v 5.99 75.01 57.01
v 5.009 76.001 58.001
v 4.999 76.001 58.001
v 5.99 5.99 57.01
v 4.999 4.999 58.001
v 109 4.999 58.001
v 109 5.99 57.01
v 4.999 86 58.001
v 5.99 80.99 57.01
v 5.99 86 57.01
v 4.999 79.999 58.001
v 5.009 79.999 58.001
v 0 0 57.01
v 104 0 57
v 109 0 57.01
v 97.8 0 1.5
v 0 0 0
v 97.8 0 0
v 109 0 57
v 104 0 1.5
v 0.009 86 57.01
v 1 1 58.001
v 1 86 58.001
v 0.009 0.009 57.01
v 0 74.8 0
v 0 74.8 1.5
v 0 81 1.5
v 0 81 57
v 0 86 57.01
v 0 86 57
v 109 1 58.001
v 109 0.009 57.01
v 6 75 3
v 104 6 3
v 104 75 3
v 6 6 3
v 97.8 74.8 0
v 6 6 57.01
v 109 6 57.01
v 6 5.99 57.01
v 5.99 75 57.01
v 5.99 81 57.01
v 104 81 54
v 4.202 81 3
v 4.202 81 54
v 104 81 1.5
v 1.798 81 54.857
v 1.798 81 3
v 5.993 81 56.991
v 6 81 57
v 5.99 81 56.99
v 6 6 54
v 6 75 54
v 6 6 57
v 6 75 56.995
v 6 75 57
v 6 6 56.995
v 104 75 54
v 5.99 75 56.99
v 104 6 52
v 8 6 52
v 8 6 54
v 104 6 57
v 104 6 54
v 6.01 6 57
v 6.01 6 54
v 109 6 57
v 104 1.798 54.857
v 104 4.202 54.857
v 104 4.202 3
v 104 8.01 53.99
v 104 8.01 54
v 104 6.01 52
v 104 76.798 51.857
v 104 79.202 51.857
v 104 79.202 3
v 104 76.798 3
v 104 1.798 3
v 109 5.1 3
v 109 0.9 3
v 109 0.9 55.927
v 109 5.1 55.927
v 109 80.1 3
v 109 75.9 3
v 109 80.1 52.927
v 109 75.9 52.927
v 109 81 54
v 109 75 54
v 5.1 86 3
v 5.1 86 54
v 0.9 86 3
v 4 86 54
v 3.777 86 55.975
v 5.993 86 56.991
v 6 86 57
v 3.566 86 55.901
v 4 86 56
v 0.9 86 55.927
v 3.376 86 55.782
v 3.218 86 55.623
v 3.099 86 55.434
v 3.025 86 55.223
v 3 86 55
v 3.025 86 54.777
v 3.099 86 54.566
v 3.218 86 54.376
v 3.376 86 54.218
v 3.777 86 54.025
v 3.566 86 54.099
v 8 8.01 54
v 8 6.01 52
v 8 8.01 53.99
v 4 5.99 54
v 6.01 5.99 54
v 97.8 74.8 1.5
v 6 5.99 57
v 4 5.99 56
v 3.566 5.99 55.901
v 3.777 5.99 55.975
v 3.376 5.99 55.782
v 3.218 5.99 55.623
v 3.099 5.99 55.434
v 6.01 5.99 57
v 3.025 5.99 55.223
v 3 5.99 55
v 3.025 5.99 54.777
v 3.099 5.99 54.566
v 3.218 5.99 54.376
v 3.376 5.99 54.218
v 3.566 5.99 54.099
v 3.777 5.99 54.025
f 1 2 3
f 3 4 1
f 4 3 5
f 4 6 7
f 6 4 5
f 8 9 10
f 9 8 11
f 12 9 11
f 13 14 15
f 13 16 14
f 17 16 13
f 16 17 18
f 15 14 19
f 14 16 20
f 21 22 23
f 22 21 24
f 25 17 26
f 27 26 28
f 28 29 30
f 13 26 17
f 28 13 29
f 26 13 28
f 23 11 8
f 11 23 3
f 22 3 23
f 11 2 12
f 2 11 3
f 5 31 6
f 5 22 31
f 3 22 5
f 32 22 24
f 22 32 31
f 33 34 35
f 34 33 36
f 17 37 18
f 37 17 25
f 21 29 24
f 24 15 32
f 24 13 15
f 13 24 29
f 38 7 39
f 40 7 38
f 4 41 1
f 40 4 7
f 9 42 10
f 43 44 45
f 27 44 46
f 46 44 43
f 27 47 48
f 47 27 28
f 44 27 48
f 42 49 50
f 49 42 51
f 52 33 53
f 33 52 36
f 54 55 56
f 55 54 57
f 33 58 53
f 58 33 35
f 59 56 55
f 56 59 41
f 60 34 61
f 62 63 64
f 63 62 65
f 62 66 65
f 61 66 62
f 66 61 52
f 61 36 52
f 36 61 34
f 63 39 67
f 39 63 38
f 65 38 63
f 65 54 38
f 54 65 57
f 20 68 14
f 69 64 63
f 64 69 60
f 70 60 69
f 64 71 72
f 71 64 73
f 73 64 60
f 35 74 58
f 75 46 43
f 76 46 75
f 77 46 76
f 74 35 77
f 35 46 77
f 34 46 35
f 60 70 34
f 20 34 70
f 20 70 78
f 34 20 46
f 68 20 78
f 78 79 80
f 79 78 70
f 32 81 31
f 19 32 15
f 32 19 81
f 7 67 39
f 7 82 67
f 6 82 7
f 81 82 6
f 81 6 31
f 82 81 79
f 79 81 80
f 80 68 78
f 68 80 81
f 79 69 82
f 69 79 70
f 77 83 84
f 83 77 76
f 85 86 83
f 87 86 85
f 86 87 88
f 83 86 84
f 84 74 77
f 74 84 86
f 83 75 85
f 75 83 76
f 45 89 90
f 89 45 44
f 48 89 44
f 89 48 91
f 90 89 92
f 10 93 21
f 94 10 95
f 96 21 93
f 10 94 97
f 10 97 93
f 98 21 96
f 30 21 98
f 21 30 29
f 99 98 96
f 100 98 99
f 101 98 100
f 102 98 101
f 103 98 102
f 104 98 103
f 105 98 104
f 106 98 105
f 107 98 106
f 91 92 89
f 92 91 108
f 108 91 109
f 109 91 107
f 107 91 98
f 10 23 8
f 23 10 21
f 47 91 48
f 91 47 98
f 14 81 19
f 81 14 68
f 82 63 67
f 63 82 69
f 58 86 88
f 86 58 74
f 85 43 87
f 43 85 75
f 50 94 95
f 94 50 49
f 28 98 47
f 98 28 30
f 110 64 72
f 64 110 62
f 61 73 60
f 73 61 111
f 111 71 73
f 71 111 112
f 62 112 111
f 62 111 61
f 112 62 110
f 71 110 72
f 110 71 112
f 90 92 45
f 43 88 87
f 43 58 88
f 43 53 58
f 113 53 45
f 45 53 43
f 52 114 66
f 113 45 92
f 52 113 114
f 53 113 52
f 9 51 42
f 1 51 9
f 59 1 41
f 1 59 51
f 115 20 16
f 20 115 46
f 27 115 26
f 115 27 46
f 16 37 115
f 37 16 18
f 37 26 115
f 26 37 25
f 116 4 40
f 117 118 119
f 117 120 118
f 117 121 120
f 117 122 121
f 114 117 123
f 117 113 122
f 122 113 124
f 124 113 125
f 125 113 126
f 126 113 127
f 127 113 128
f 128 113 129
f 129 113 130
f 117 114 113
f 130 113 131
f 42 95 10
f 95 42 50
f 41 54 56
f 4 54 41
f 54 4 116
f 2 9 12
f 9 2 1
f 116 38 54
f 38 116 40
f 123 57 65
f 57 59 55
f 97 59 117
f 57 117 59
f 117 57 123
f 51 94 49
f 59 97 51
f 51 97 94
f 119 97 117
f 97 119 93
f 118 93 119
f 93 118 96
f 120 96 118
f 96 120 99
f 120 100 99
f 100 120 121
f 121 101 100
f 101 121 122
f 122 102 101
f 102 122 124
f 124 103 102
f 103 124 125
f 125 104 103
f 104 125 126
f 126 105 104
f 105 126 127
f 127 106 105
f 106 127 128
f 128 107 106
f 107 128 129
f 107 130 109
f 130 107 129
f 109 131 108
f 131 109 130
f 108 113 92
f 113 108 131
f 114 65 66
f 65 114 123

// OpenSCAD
// ============================================================================
// cutlery_box.scad
// Graduated 3-chamber disposable-cutlery box (Option 3) — CUT-FROM-SOLID port
// of build_box.py, for a 120 x 120 x 120 mm printer (AOSEED).
//
// WHY THIS PORT EXISTS (the whole point):
//   The hand-mesh generator (build_box.py) could not keep the 1 mm rim chamfer
//   continuous across the female dovetail joints, because where a slot's flared
//   corner crosses the sloped chamfer it needs a true boolean intersection.
//   OpenSCAD HAS that boolean kernel, so here we do exactly the "cut-from-solid"
//   thing:
//      1. Build the ENTIRE box as ONE solid, WITH the chamfer already on it.
//      2. difference() out vertical dovetail prisms ( /_\ cross-section ),
//         running from just above the base plate up THROUGH the rim, to both
//         (a) form the sliding-dovetail joints, and
//         (b) split the box into 6 bed-sized pieces.
//   Because the cut is a real boolean through the already-chamfered solid, the
//   sloped chamfer<->slot edge is produced for free => the rim chamfer stays
//   CONTINUOUS across every joint, with none of the sliver hacks.
//
// ----------------------------------------------------------------------------
// HOW TO USE
//   In the app:  set `part` below (or use the Customizer dropdown), F5 to
//                preview, F6 to render, then File > Export > STL.
//   One piece (CLI):
//      openscad -o body_knife_A.stl -D 'part="knife_A"' cutlery_box.scad
//   ALL SIX (bash, run from this folder):
//      for p in knife_A knife_B fork_A fork_B spoon_A spoon_B; do \
//        openscad -o "body_$p.stl" -D "part=\"$p\"" cutlery_box.scad ; done
//   PNG preview of one piece:
//      openscad -o knife_B.png --imgsize=1400,1000 --autocenter --viewall \
//        -D 'part="knife_B"' cutlery_box.scad
//
//   Pieces are modelled in ASSEMBLED coordinates (floor-down, z=0 is the bed),
//   so importing all six STLs together shows the assembled box directly; your
//   slicer will auto-drop each one onto the plate for printing.
//
// BED SANITY: every piece is <= 120 mm in X, Y, Z.
//   Z = 58 mm. Widest piece = spoon at 117 mm (Y). A-halves reach 109 mm (X,
//   including the protruding dovetail key). All under 120.
//
// !! I could NOT run OpenSCAD to verify this file (no binary in my sandbox) !!
//   - The rim chamfer is a SMOOTH, true-45 bevel built from hull() frustums of
//     convex rectangles. Works in every OpenSCAD since ~2015 (incl. Homebrew
//     2021.01). No stepped staircase -- and, crucially, it makes box() a clean
//     well-formed solid so the per-part booleans resolve reliably (the old
//     14-slice staircase was fragile and CGAL was dropping the walls of the
//     interior parts, leaving only the key prisms => "floating boxes").
//   - roof() is still available behind USE_ROOF=true for those who have it
//     (2021.01+ snapshots); for THIS rectangular design it is identical, so it
//     is NOT required.
//   - After F6, check the console for "WARNING"/"not a valid 2-manifold".
//     If a tenon ever looks detached, bump EPS to 0.05.
// ============================================================================


/* [Part to render / export] */
part = "knife_A"; // [knife_A, knife_B, fork_A, fork_B, spoon_A, spoon_B, assembly]

/* [Chamfer method] */
// false = smooth hull() frustum bevel (default, any OpenSCAD); true = roof() (2021.01+)
USE_ROOF = false;

/* [Heights (mm)] */
BASE   = 3.0;     // floor / base-plate thickness
COMP_H = 55.0;    // interior wall height above the floor (cutlery stack depth)

/* [Walls (mm)] */
HOST_T   = 6.0;     // thickness of every wall (thick enough to host a dovetail)
HALF_LEN = 104.0;   // printed length of each half (A = near, B = far); <120 incl. key

/* [Chamber bays (mm)] */
N_COL     = 3;       // columns of cutlery per chamber
KNIFE_COL = 23.0;    // -> knife bay 69  (3 x 19 mm knives + play)
FORK_COL  = 33.0;    // -> fork  bay 99  (3 x 29 mm forks  + play)
SPOON_COL = 37.0;    // -> spoon bay 111 (3 x 34 mm spoons + play, trimmed <120)

/* [Dovetail joint (mm)] */
DT_DEPTH = 5.0;   // tail protrusion past the seam (male key depth)
DT_NECK  = 1.2;   // half-width at the seam face (narrow)
DT_FLARE = 2.1;   // half-width at the tip (wide -> locks)
DT_CLR   = 0.4;   // FLANK/seam slide clearance added to the female socket (do not change for fit)
DT_DEPTH_RELIEF = 0.3; // extra depth on the socket BACK only, so the tail tip never bottoms out

/* [Hidden-dovetail top cap / "hat" (mm)] */
// The dovetail otherwise shows its trapezoid outline on the TOP edge of the wall.
// To hide it, the MALE piece extends the wall's full-width top (chamfer included)
// across the key footprint -> a flush, continuous top. The FEMALE piece gets a
// matching top RECESS (cap footprint + CAP_CLR) so the cap drops straight in.
// Result: the top reads as one surface with a single straight seam line at the cap
// tip; the dovetail joinery lives entirely below the cap.
//
// SELF-SUPPORTING UNDERSIDE: the cap reaches the FULL wall width at the chamfer base
// (so the top edge reads as the wall extended, with NO recessed sliver on the outer
// face), and its underside is ONE planar ramp from the chamfer's OUTER CORNER
// (half-width HOST_T/2 at z = BODY_H-CHAMFER) down to the dovetail-neck half-width
// (CAP_FOOT) at CAP_SLANT_DEG from horizontal. No little horizontal step. The ramp
// reaching full width exactly at the chamfer base means "ramp top" == "chamfer base"
// (CAP_H is DERIVED). The FEMALE recess is the same ramp + CAP_CLR play.
// TRADEOFF: because the cap runs all the way to the outer corner, the female wall
// tapers to ~0 at z = BODY_H-CHAMFER -> a thin feather edge at the joint (gradual at
// CAP_SLANT_DEG, hidden inside the joint when assembled). Accepted per design intent.
CAP_SLANT_DEG = 50;     // cap underside ramp angle from horizontal (50 = self-supporting, long flare)
CAP_FOOT = DT_NECK;     // cap-underside half-width where it meets the dovetail neck
CAP_CLR = 0.3;          // slide clearance so the male cap seats into the female top recess

/* [Rim chamfer (mm)] */
CHAMFER = 1.0;    // 45-deg comfort break broken along the top wall edges

/* [Base half-lap / anti-warp (mm)] */
// Neighbouring base plates overlap as a HORIZONTAL half-lap (shiplap) at mid-base
// height, so corners stay coplanar (no lift/protrusion). Horizontal lap faces do
// NOT bind the vertical-drop assembly. Shingle direction: A->B and knife->fork->spoon.
LAP_LEN = 6;        // overlap past the A/B seam and the knife/fork seam
LAP_LEN_FS = 2;     // overlap past the fork/SPOON seam -- SMALLER: spoon is the
                    // tightest piece (117mm of the 120mm bed); a 6mm lap there
                    // would push spoon to 123mm. 2mm keeps spoon at 119mm.
LAP_Z   = BASE/2;   // 1.5 -- horizontal split height of the lap (bottom vs top half)
LAP_CLR = 0.2;      // in-plane clearance so the shelf isn't a press fit

/* [Lid — box features that receive a flat ORDERED clear sheet] */
// The lid itself is NOT printed: it's a flat ~2 mm PETG/Tritan sheet, bullnose-polished
// edges (r=LID_EDGE_R), ordered to size. We only model the box features that receive it.
LID_T            = 2.0;   // ordered sheet thickness
LID_EDGE_R       = 1.0;   // ordered sheet bullnose edge radius (for the sheet order spec)
LID_PLAY         = 0.4;   // total vertical play in the hinge groove (sheet + this)
LID_RECESS       = 2.0;   // lid TOP sits this far BELOW the rim, so the journal pocket is fully
                          // capped (rim caps the bullnose -> retains the lid when raised; tilt-in)
HINGE_AT_MINUS_X = true;  // hinge on the -x (303mm) end wall; clip on +x. (flip = mirror; default delivered)
// perimeter support ledge (lid underside rests on it at z = BODY_H-LID_T)
LEDGE_W          = 2.0;   // ledge inward protrusion (its underside ramps back at 45 deg -> self-supporting)
GROOVE_END_INSET = 0.0;   // groove reaches the corners but RUNS OUT smoothly there (no end-face / no
                          // exposed bore); GROOVE_TAPER sets the run-out length
GROOVE_TAPER     = 4.0;   // y-length over which the eased mouth tapers out at each groove end
// hinge journal (cut into the inner face of the hinge end wall, CONTINUOUS along the long edge)
GROOVE_DEPTH     = 3.0;   // 2mm lead-in slot + 1mm pocket radius -> journal sits 2mm back from the
                          // face so its cap clears the swing relief and RETAINS the lid
GROOVE_POCKET_R  = 1.0;   // journal half-cylinder radius (the bullnose sheet edge rolls in it)
// clip latch — TWO light DETENT clips on the clip end wall, flanking a central finger notch.
// "Light detent" = small overhang so the rigid sheet pops past it by hand (not a firm lock).
CLIP_W           = 8.0;   // width of EACH of the two clips
CLIP_LIP         = 0.3;   // retaining overhang (light detent; 0.3 soft .. 0.6 firm-but-stiff)
CLIP_RAMP_H      = 1.6;   // cam-ramp height (press-to-close lead-in)
// finger notch — a through-cut in the clip wall (visible from outside), centered between the
// two clips, so a fingertip can reach the lid edge and lift it (popping both clips at once).
NOTCH_W          = 20.0;  // finger-notch width
NOTCH_DEPTH      = 6.0;   // how far down from the rim to the deepest point (past the lid edge)
NOTCH_ARCH       = 4.0;   // bottom is an ELLIPTICAL arch this tall; the rest is vertical sides
                          // (NOTCH_ARCH < NOTCH_W/2 -> a gentle arch, not a deep half-circle)


/* [Hidden] */
EPS      = 0.01;          // tiny overlap so abutting solids fuse cleanly in CGAL
// Upper-chamber pieces (fork, spoon) were cut by a cell plane laid EXACTLY on the
// divider wall's far face (the lower chamber owns that wall). intersection() along a
// plane coincident with an existing box face makes CGAL leave a ZERO-THICKNESS copy
// of the wall face -> edge-manifold + "watertight" but degenerate (OpenSCAD shows it
// as a blue back-face; Tinkercad thickens it into a phantom block). SEAM_EPS nudges
// those cut planes a hair INTO the open bay so they no longer coincide with any box
// face -> no flap. 0.02 mm is physically nothing but is well clear of CGAL's tolerance.
SEAM_EPS = 0.02;
CUT_OVER = 1.0;           // how far dovetail cutters overshoot the rim (clean cut)

BODY_H    = BASE + COMP_H;     // 58  total height
END_WALL  = HOST_T;            // end walls are dovetail hosts too -> equally thick
TOTAL_LEN = 2 * HALF_LEN;      // 208 assembled length (end wall .. end wall)

// hidden-cap ramp geometry (derived).
//   CAP_HW    = cap MAX half-width = HOST_T/2 (the full wall edge) at the chamfer base.
//   CAP_RISE  = vertical height of the self-supporting CAP_SLANT_DEG underside ramp.
//   CAP_ZRAMP = where the cap reaches full width = the chamfer base (BODY_H-CHAMFER), so
//               the ramp runs straight to the chamfer OUTER CORNER (no horizontal step).
//   CAP_ZBOT  = cap bottom = ramp start; CAP_H derived from it (for reference/report).
//   CAP_ZRAMP_R = recess ramp top, shifted down by CAP_CLR so the recess ramp stays
//               parallel to the cap ramp with uniform play.
CAP_HW      = HOST_T/2;   // cap reaches the FULL wall edge at the chamfer base
CAP_RISE    = (CAP_HW - CAP_FOOT) * tan(CAP_SLANT_DEG);
CAP_ZRAMP   = BODY_H - CHAMFER;               // full width exactly at the chamfer base / outer corner
CAP_ZBOT    = CAP_ZRAMP - CAP_RISE;
CAP_H       = BODY_H - CAP_ZBOT;              // derived; reported
CAP_ZRAMP_R = CAP_ZRAMP;   // recess ramp ALSO tops at the chamfer corner (mirror the cap) -> no vertical lip
// sanity checks
assert(CAP_ZBOT > BASE + 1,
       "cap zone dips too low -- raise CAP_SLANT_DEG");
assert(CAP_HW >= DT_FLARE,
       "cap too narrow to cover the dovetail tail");

// NOTE: lid-derived constants are defined BELOW the Y-layout block, because some of
// them (INTERIOR_Y0/Y1, CLIP_CY) depend on OUTER_L / OUTER_R / EXT_W. See "lid derived".

// bay widths
KNIFE_BAY = N_COL * KNIFE_COL; // 69
FORK_BAY  = N_COL * FORK_COL;  // 99
SPOON_BAY = N_COL * SPOON_COL; // 111

// ---- Y layout (width direction): wall | bay | divider | bay | divider | bay | wall
KNIFE_Y0 = 0;
KNIFE_Y1 = HOST_T + KNIFE_BAY + HOST_T;        // 0..81   (outer wall + bay + divider)
FORK_Y0  = KNIFE_Y1;                           // 81
FORK_Y1  = FORK_Y0 + FORK_BAY + HOST_T;        // 81..186 (bay + divider)
SPOON_Y0 = FORK_Y1;                            // 186
SPOON_Y1 = SPOON_Y0 + SPOON_BAY + HOST_T;      // 186..303(bay + outer wall)
EXT_W    = SPOON_Y1;                           // 303 total width

// lengthwise wall Y-bands [y0,y1] (host the A/B dovetails) + their centers
OUTER_L  = [0, HOST_T];                                       // [0,6]    c=3
DIV_KF   = [HOST_T + KNIFE_BAY, HOST_T + KNIFE_BAY + HOST_T]; // [75,81]  c=78
DIV_FS   = [FORK_Y0 + FORK_BAY, FORK_Y0 + FORK_BAY + HOST_T]; // [180,186]c=183
OUTER_R  = [SPOON_Y1 - HOST_T, SPOON_Y1];                     // [297,303]c=300

// ---- lid derived ---- (placed AFTER OUTER_L/OUTER_R/EXT_W so nothing is forward-referenced)
LID_TOP_Z   = BODY_H - LID_RECESS;        // 56  lid TOP (recessed); rim z=58 rises LID_RECESS above it
LID_Z_UNDER = LID_TOP_Z - LID_T;          // 54  lid underside / ledge top / lowered-divider top
POCKET_CZ   = LID_TOP_Z - LID_T/2;        // 55  journal centre (lid mid) -> pocket top = LID_TOP_Z = capped
// hinge end-wall inner face x + inward direction; clip end-wall inner face x + inward dir
HINGE_INX   = HINGE_AT_MINUS_X ? END_WALL : TOTAL_LEN - END_WALL;       // 6  (default)
HINGE_IN    = HINGE_AT_MINUS_X ? 1 : -1;  // interior direction from the hinge wall (+x default)
CLIP_INX    = HINGE_AT_MINUS_X ? TOTAL_LEN - END_WALL : END_WALL;       // 202 (default)
CLIP_IN     = HINGE_AT_MINUS_X ? -1 : 1;  // interior direction from the clip wall (-x default)
POCKET_CX   = HINGE_INX - HINGE_IN*(GROOVE_DEPTH - GROOVE_POCKET_R);    // 5  pocket centre x (INTO the wall)
INTERIOR_Y0 = OUTER_L[1];                 // 6   inner face of the -y short wall
INTERIOR_Y1 = OUTER_R[0];                 // 297 inner face of the +y short wall
CLIP_CY     = EXT_W/2;                     // 151.5 clip/scallop centre (in the fork chamber)
assert(POCKET_CZ - GROOVE_POCKET_R > BASE + 1,
       "journal dips too low -- reduce LID_RECESS or LID_T");
assert(POCKET_CZ + GROOVE_POCKET_R <= LID_TOP_Z + EPS,
       "journal not capped -- lower the lid (raise LID_RECESS) or shrink GROOVE_POCKET_R");
// NOTE: with LID_RECESS the lid underside (and lowered dividers) sit BELOW CAP_ZBOT. That is
// intended: the inner dividers are cut flat below the cap zone (their hidden caps are removed,
// but the lid covers them); the perimeter/end-wall caps are untouched (full-height walls).

// the three OPEN bays are rectangular holes in the wall footprint:
//   footprint = outer rectangle MINUS these bays  (== the 6 walls; verified).
// The smooth chamfer is built from exactly this decomposition.
BAY_X0 = END_WALL;              // 6
BAY_X1 = TOTAL_LEN - END_WALL;  // 202
BAYS = [
    [BAY_X0, BAY_X1, HOST_T,   HOST_T + KNIFE_BAY],   // knife bay [6,202] x [6,75]
    [BAY_X0, BAY_X1, FORK_Y0,  FORK_Y0 + FORK_BAY],   // fork  bay [6,202] x [81,180]
    [BAY_X0, BAY_X1, SPOON_Y0, SPOON_Y0 + SPOON_BAY], // spoon bay [6,202] x [186,297]
];

YC_OUTL  = OUTER_L[0] + HOST_T/2;   // 3   outer-left wall center
YC_DIVKF = DIV_KF[0]  + HOST_T/2;   // 78  knife/fork divider center
YC_DIVFS = DIV_FS[0]  + HOST_T/2;   // 183 fork/spoon divider center
YC_OUTR  = OUTER_R[0] + HOST_T/2;   // 300 outer-right wall center

// seams
AB_SEAM = HALF_LEN;               // 104  A/B length seam (x)
SEAM_KF = FORK_Y0;                // 81   knife/fork width seam (y)
SEAM_FS = SPOON_Y0;              // 186  fork/spoon width seam (y)
ENDC_A  = END_WALL/2;             // 3    A end-wall center (x) -> chamber dovetails
ENDC_B  = TOTAL_LEN - END_WALL/2; // 205  B end-wall center (x)


// ============================================================================
// 2D wall footprint (cross-section of all walls, constant in z for the straight
// part). Union of: 2 full-width end walls + 4 lengthwise walls between them.
// ============================================================================
module wall_footprint_2d() {
    // footprint = outer rectangle minus the 3 open bays  (== the 6 walls)
    difference() {
        square([TOTAL_LEN, EXT_W]);
        for (b = BAYS) translate([b[0], b[2]]) square([b[1] - b[0], b[3] - b[2]]);
    }
}

// ============================================================================
// The full chamfered box solid = base plate + walls with a continuous 1 mm
// top-rim chamfer. Built ONCE; every piece is carved out of this.
// ============================================================================
module chamfer_cap() {
    // SMOOTH 45 rim chamfer over z[BODY_H-CHAMFER, BODY_H], in absolute coords.
    zm = BODY_H - CHAMFER;
    if (USE_ROOF) {
        // exact straight-skeleton roof, capped at CHAMFER height (needs roof()).
        intersection() {
            translate([0,0,zm]) roof() wall_footprint_2d();
            translate([0,0,zm]) linear_extrude(CHAMFER + EPS) wall_footprint_2d();
        }
    } else {
        // DEFAULT: true 45 bevel as hull() frustums of CONVEX rectangles -> smooth
        // AND a clean manifold.  Since footprint = outer - bays, the chamfer of the
        // footprint = (outer rectangle beveled inward) MINUS (each bay beveled so it
        // grows toward the top, which bevels every bay-facing rim).  All hull()s are
        // on convex rectangles, so nothing gets convex-filled.
        difference() {
            // outer perimeter frustum: full outer rect at zm -> inset by CHAMFER at top
            hull() {
                translate([0,0,zm])     linear_extrude(0.001) square([TOTAL_LEN, EXT_W]);
                translate([0,0,BODY_H]) linear_extrude(0.001) offset(delta=-CHAMFER) square([TOTAL_LEN, EXT_W]);
            }
            // each bay grows by CHAMFER toward the top -> bevels its surrounding rim.
            // (overshoots z a hair past both ends so the cut is clean.)
            for (b = BAYS)
                hull() {
                    translate([0,0,zm-EPS])     linear_extrude(0.001)
                        translate([b[0],b[2]]) offset(delta=-EPS)        square([b[1]-b[0], b[3]-b[2]]);
                    translate([0,0,BODY_H+EPS]) linear_extrude(0.001)
                        translate([b[0],b[2]]) offset(delta=CHAMFER+EPS) square([b[1]-b[0], b[3]-b[2]]);
                }
        }
    }
}

module box() {
    zm = BODY_H - CHAMFER;
    union() {
        cube([TOTAL_LEN, EXT_W, BASE]);                                        // base plate z[0,3]
        translate([0,0,BASE]) linear_extrude(zm - BASE + EPS) wall_footprint_2d(); // straight walls z[3,57]
        chamfer_cap();                                                         // smooth chamfer z[57,58]
    }
}

// ============================================================================
// Dovetail prisms ( /_\ ). Vertical, z[BASE, BODY_H+CUT_OVER] so they cut
// through the rim but leave the base plate continuous. The near face is pushed
// back EPS so a male key always fuses to its wall.
//   male key   : half_n=DT_NECK,         half_f=DT_FLARE
//   female slot: half_n=DT_NECK+DT_CLR,  half_f=DT_FLARE+DT_CLR
// ============================================================================
module dt_prism_X(seam_x, yc, half_n, half_f) {   // perpendicular to X, grows +X
    translate([0,0,BASE]) linear_extrude(BODY_H - BASE + CUT_OVER)
        polygon([[seam_x - EPS,        yc - half_n],
                 [seam_x + DT_DEPTH,   yc - half_f],
                 [seam_x + DT_DEPTH,   yc + half_f],
                 [seam_x - EPS,        yc + half_n]]);
}
module dt_prism_Y(seam_y, xc, half_n, half_f) {   // perpendicular to Y, grows +Y
    translate([0,0,BASE]) linear_extrude(BODY_H - BASE + CUT_OVER)
        polygon([[xc - half_n, seam_y - EPS],
                 [xc - half_f, seam_y + DT_DEPTH],
                 [xc + half_f, seam_y + DT_DEPTH],
                 [xc + half_n, seam_y - EPS]]);
}
module ab_key   (yc)        { dt_prism_X(AB_SEAM, yc, DT_NECK, DT_FLARE); }
module ch_key   (seam_y, xc){ dt_prism_Y(seam_y, xc, DT_NECK, DT_FLARE); }

// Female sockets = male + DT_CLR on the flanks/seam (unchanged), PLUS a straight
// back-face relief of DT_DEPTH_RELIEF so the tail tip never bottoms out. The
// relief is a rectangle tacked onto the trapezoid's tip at the SAME flare width,
// so the angled flank faces (and their 0.4 mm slide clearance) are untouched.
module ab_socket(yc) {
    dt_prism_X(AB_SEAM, yc, DT_NECK + DT_CLR, DT_FLARE + DT_CLR);
    translate([0,0,BASE]) linear_extrude(BODY_H - BASE + CUT_OVER)
        translate([AB_SEAM + DT_DEPTH, yc - (DT_FLARE + DT_CLR)])
            square([DT_DEPTH_RELIEF, 2*(DT_FLARE + DT_CLR)]);          // back relief, +X
}
module ch_socket(seam_y, xc) {
    dt_prism_Y(seam_y, xc, DT_NECK + DT_CLR, DT_FLARE + DT_CLR);
    translate([0,0,BASE]) linear_extrude(BODY_H - BASE + CUT_OVER)
        translate([xc - (DT_FLARE + DT_CLR), seam_y + DT_DEPTH])
            square([2*(DT_FLARE + DT_CLR), DT_DEPTH_RELIEF]);          // back relief, +Y
}

// ===== hidden-dovetail top cap ("hat"), SELF-SUPPORTING underside ===============
// MALE cap: a FULL-wall-width hat whose underside is ONE planar ramp from the chamfer's
// OUTER CORNER (half-width CAP_HW = HOST_T/2 at CAP_ZRAMP = BODY_H-CHAMFER) down to the
// dovetail-neck half-width (CAP_FOOT) at CAP_SLANT_DEG from horizontal -> the self-
// supporting shoulder, running straight to the corner (no horizontal step). Built as
// hull(narrow bottom slab buried in the tail neck, full-width top slab through the rim);
// box() trims it to the wall and adds the continuous rim chamfer for free, so the outer
// top edge reads as the wall extended (no recessed sliver). The protruding NOSE is left
// SQUARE (vertical) -- hidden in the female socket when assembled.
// TRADEOFF: the female wall tapers to ~0 at z=BODY_H-CHAMFER (a thin feather edge at the
// joint, gradual at CAP_SLANT_DEG) -- accepted per design intent.
module ab_cap(yc) {   // A/B seam, grows +X past the seam (length direction)
    hull() {
        translate([AB_SEAM - EPS, yc - CAP_FOOT, CAP_ZBOT])
            cube([DT_DEPTH + EPS, 2*CAP_FOOT, EPS]);
        translate([AB_SEAM - EPS, yc - CAP_HW,   CAP_ZRAMP])
            cube([DT_DEPTH + EPS, 2*CAP_HW, (BODY_H + CUT_OVER) - CAP_ZRAMP]);
    }
}
module ch_cap(seam_y, xc) {   // chamber seam, grows +Y past the seam (in the end wall)
    hull() {
        translate([xc - CAP_FOOT, seam_y - EPS, CAP_ZBOT])
            cube([2*CAP_FOOT, DT_DEPTH + EPS, EPS]);
        translate([xc - CAP_HW,   seam_y - EPS, CAP_ZRAMP])
            cube([2*CAP_HW, DT_DEPTH + EPS, (BODY_H + CUT_OVER) - CAP_ZRAMP]);
    }
}
// FEMALE recess: the SAME ramp grown by CAP_CLR (flanks, tip, floor, and ramp shifted down
// by CAP_CLR so it stays parallel) -> the cap seats with uniform slide clearance. It opens
// to the wall edge (and a hair past, into air) so the cap's full-width corner drops in;
// this is what leaves the thin female feather at the top (accepted). Open upward + toward seam.
module ab_cap_neg(yc) {
    hull() {
        translate([AB_SEAM - EPS, yc - (CAP_FOOT + CAP_CLR), CAP_ZBOT - CAP_CLR])
            cube([DT_DEPTH + CAP_CLR + EPS, 2*(CAP_FOOT + CAP_CLR), EPS]);
        translate([AB_SEAM - EPS, yc - (CAP_HW + EPS), CAP_ZRAMP_R])
            cube([DT_DEPTH + CAP_CLR + EPS, 2*(CAP_HW + EPS), (BODY_H + CUT_OVER + 1) - CAP_ZRAMP_R]);
    }
}
module ch_cap_neg(seam_y, xc) {
    hull() {
        translate([xc - (CAP_FOOT + CAP_CLR), seam_y - EPS, CAP_ZBOT - CAP_CLR])
            cube([2*(CAP_FOOT + CAP_CLR), DT_DEPTH + CAP_CLR + EPS, EPS]);
        translate([xc - (CAP_HW + EPS), seam_y - EPS, CAP_ZRAMP_R])
            cube([2*(CAP_HW + EPS), DT_DEPTH + CAP_CLR + EPS, (BODY_H + CUT_OVER + 1) - CAP_ZRAMP_R]);
    }
}
// LOWERED-DIVIDER hat: same 50-deg self-supporting cap as ab_cap, but reaching FULL width at the
// LOWERED divider top (LID_Z_UNDER) instead of the rim -- because the inner dividers are lowered
// for the lid, which strips their normal cap. It extends above the top and is trimmed flush to
// LID_Z_UNDER by divider_lower(), so the divider top reads as one surface (dovetail hidden below).
DCAP_ZRAMP = LID_Z_UNDER;            // full width at the lowered divider top (54)
DCAP_ZBOT  = DCAP_ZRAMP - CAP_RISE;  // ramp start (neck), 50 deg below
module div_cap(yc) {        // male hat on the lowered divider (A/B seam)
    hull() {
        translate([AB_SEAM - EPS, yc - CAP_FOOT, DCAP_ZBOT])
            cube([DT_DEPTH + EPS, 2*CAP_FOOT, EPS]);
        translate([AB_SEAM - EPS, yc - CAP_HW,   DCAP_ZRAMP])
            cube([DT_DEPTH + EPS, 2*CAP_HW, (BODY_H + CUT_OVER) - DCAP_ZRAMP]);
    }
}
module div_cap_neg(yc) {    // female recess to receive div_cap (with CAP_CLR slide play)
    hull() {
        translate([AB_SEAM - EPS, yc - (CAP_FOOT + CAP_CLR), DCAP_ZBOT - CAP_CLR])
            cube([DT_DEPTH + CAP_CLR + EPS, 2*(CAP_FOOT + CAP_CLR), EPS]);
        translate([AB_SEAM - EPS, yc - (CAP_HW + EPS), DCAP_ZRAMP])
            cube([DT_DEPTH + CAP_CLR + EPS, 2*(CAP_HW + EPS), (BODY_H + CUT_OVER + 1) - DCAP_ZRAMP]);
    }
}

// rectangular cell (x[xa,xb], y[ya,yb], full height + margin) used to split pieces
module cell(xa, xb, ya, yb) {
    translate([xa, ya, -1]) cube([xb - xa, yb - ya, BODY_H + 11]);
}

// ===== base half-lap (shiplap) =================================================
// HORIZONTAL lap at mid-base height: the shelf-owner keeps its BOTTOM half
// (z 0..LAP_Z) extending LAP_LEN past the seam; the neighbour has its bottom half
// REMOVED there (keeps only the top half) and lands flat on the shelf. Horizontal
// faces => no binding during the vertical drop. Shelves live entirely in the base
// (z < BASE), well clear of the wall dovetails (z >= BASE).
// Shingle = FEMALE-first (matches the no-notch dovetail assembly order, which
// lowers the male piece onto the female): the B half owns the A/B shelf (grows
// -X into A) and the UPPER chamber (fork, spoon) owns the chamber shelf (grows
// -Y into the lower chamber).  Order: spoon, fork, knife; B before A.
module lap_shelf_X(y0, y1) {                 // B-side shelf, grows -X into A past AB_SEAM
    // +EPS past AB_SEAM so the shelf interpenetrates (not just abuts) its own B body -> fuses cleanly.
    translate([AB_SEAM - LAP_LEN, y0, 0]) cube([LAP_LEN + EPS, y1 - y0, LAP_Z]);
}
module lap_neg_X(y0, y1) {                   // A-side: remove bottom half to receive it
    translate([AB_SEAM - LAP_LEN - LAP_CLR, y0 - EPS, -EPS])
        cube([LAP_LEN + LAP_CLR + EPS, (y1 - y0) + 2*EPS, LAP_Z + EPS]);
}
module lap_shelf_Y(seam_y, x0, x1, ln=LAP_LEN) {   // upper-chamber shelf, grows -Y into lower
    // grows -Y by `ln` into the lower chamber AND +Y by 2*SEAM_EPS past the seam so it
    // always overlaps the (SEAM_EPS-nudged) body floor and stays fused -> no floating shelf.
    translate([x0, seam_y - ln, 0]) cube([x1 - x0, ln + 2*SEAM_EPS, LAP_Z]);
}
module lap_neg_Y(seam_y, x0, x1, ln=LAP_LEN) {     // lower-chamber: remove bottom half
    translate([x0 - EPS, seam_y - ln - LAP_CLR, -EPS])
        cube([(x1 - x0) + 2*EPS, ln + LAP_CLR + EPS, LAP_Z + EPS]);
}

// ============================================================================
// LID FEATURES (receive a flat ORDERED clear sheet; the sheet is not printed).
// All features live at the TOP (z >= ~52), ABOVE the dovetail engagement, the half-lap
// (z<1.5) and most of the hat, so the vertical-drop assembly and joints are untouched.
// EPS overlaps throughout; no coincident coplanar faces with the existing walls.
// Default orientation: HINGE on the -x end wall (A pieces), CLIP on the +x end wall
// (B pieces), clip+scallop centred on the fork (middle) chamber.
// ============================================================================

// --- perimeter support ledge: 45-deg self-supporting brackets; rest face at LID_Z_UNDER.
//     Runs along the CLIP end wall + the two short outer walls. (Hinge wall uses the groove.)
//     Built as hull(thin top edge, wall column) -> a triangular bracket whose underside is
//     a 45-deg ramp (prints floor-down with no support). ADDED to each piece (clipped by cell).
//     Each run is INSET by LEDGE_W from the perpendicular walls so the three brackets never
//     overlap at a corner and the wall's normal chamfer wraps every corner uninterrupted.
module lid_ledge() {
    cy0 = INTERIOR_Y0 + LEDGE_W;  cy1 = INTERIOR_Y1 - LEDGE_W;  cyl = cy1 - cy0;   // clip-run y span (inset)
    sx0 = END_WALL    + LEDGE_W;  sxl = (TOTAL_LEN - 2*END_WALL) - 2*LEDGE_W;       // short-run x span (inset)
    // clip end wall (x = CLIP_INX), bracket protrudes toward interior (CLIP_IN)
    hull() {
        translate([CLIP_INX + CLIP_IN*LEDGE_W, cy0, LID_Z_UNDER - EPS]) cube([EPS, cyl, EPS]);
        translate([CLIP_INX - EPS,             cy0, LID_Z_UNDER - LEDGE_W]) cube([2*EPS, cyl, LEDGE_W]);
    }
    // OUTER_L short wall (y = INTERIOR_Y0), bracket protrudes +y
    hull() {
        translate([sx0, INTERIOR_Y0 + LEDGE_W, LID_Z_UNDER - EPS]) cube([sxl, EPS, EPS]);
        translate([sx0, INTERIOR_Y0 - EPS,     LID_Z_UNDER - LEDGE_W]) cube([sxl, 2*EPS, LEDGE_W]);
    }
    // OUTER_R short wall (y = INTERIOR_Y1), bracket protrudes -y
    hull() {
        translate([sx0, INTERIOR_Y1 - LEDGE_W, LID_Z_UNDER - EPS]) cube([sxl, EPS, EPS]);
        translate([sx0, INTERIOR_Y1 - EPS,     LID_Z_UNDER - LEDGE_W]) cube([sxl, 2*EPS, LEDGE_W]);
    }
}

// --- hinge groove: ONE 2D cross-section (journal bore + lead-in slot + 45-deg swing ramp),
//     CAPPED at the recessed lid top (LID_TOP_Z), swept along the wall. At BOTH ends the whole
//     profile RUNS OUT smoothly -- it tapers to the inner-top rim corner (HINGE_INX, BODY_H) --
//     so there is NO end-face and NO exposed bore at the corners; the groove just fades into the
//     wall. The rim caps the bullnose (retains the lid, tilt-in); the 45-deg ramp is self-
//     supporting and gives the swing clearance; the cap stays full over the bullnose => retains.
module groove_profile() {                            // 2D cross-section in (x, z)
    union() {
        translate([POCKET_CX, POCKET_CZ]) circle(r = GROOVE_POCKET_R, $fn = 28);              // journal bore
        translate([POCKET_CX, LID_Z_UNDER]) square([HINGE_INX - POCKET_CX + EPS, LID_T]);     // lead-in slot
        polygon([[POCKET_CX, LID_TOP_Z], [HINGE_INX + EPS, LID_TOP_Z], [HINGE_INX + EPS, BODY_H - CHAMFER]]); // swing relief (below the rim chamfer)
        polygon([[HINGE_INX, BODY_H - CHAMFER], [HINGE_INX + EPS, BODY_H + EPS], [HINGE_INX - CHAMFER, BODY_H + EPS]]); // rim chamfer cut, CONTINUOUS through the divider junctions (no bulge)
    }
}
module groove_extrude(y0, y1) {                      // sweep the profile along the wall, y0..y1
    translate([0, y0, 0]) rotate([90,0,0]) translate([0,0,-(y1 - y0)]) linear_extrude(y1 - y0) groove_profile();
}
module hinge_groove() {
    // journal runs STRAIGHT to the end of the wall at each side; the perpendicular short wall
    // caps the bore there (no run-out). The EPS overlap tucks the bore end into the short wall.
    groove_extrude(INTERIOR_Y0 - EPS, INTERIOR_Y1 + EPS);
}

// --- lower the inner chamber dividers to the lid underside (mid-support, no sag).
//     Removes the divider top over the full length; outer walls keep full height.
module divider_lower() {
    // x-span is the CHAMBER BAY only [BAY_X0, BAY_X1] (+EPS overlap into the end walls so the
    // cut is manifold). The end/outer walls keep their full BODY_H tops; only the two INNER
    // dividers (DIV_KF, DIV_FS) are lowered.
    translate([BAY_X0 - EPS, DIV_KF[0], LID_Z_UNDER]) cube([BAY_X1 - BAY_X0 + 2*EPS, HOST_T, BODY_H - LID_Z_UNDER + CUT_OVER]);
    translate([BAY_X0 - EPS, DIV_FS[0], LID_Z_UNDER]) cube([BAY_X1 - BAY_X0 + 2*EPS, HOST_T, BODY_H - LID_Z_UNDER + CUT_OVER]);
}

// --- retaining clips (ADDED): TWO light detent lips on the clip end wall, flanking the finger
//     notch. Each lip overhangs the RECESSED lid top (LID_TOP_Z) by CLIP_LIP and gives a soft
//     hold; a lead-in ramp above it cams the lid under on close. Anchored into the wall. Light
//     enough that lifting the lid edge (through the notch) flexes the sheet past both at once.
CLIP_OFF = NOTCH_W/2 + CLIP_W/2;     // clip centre offset from CLIP_CY (clips sit just outside the notch)
module one_clip(yc) {
    translate([0, yc - CLIP_W/2, 0]) rotate([90,0,0]) translate([0,0,-CLIP_W]) linear_extrude(CLIP_W)
        polygon([[CLIP_INX - CLIP_IN*HOST_T/2, LID_TOP_Z - 0.8],         // anchor low, into the wall (fuse)
                 [CLIP_INX + CLIP_IN*CLIP_LIP, LID_TOP_Z],               // lip tip: overhang over the lid top
                 [CLIP_INX + CLIP_IN*CLIP_LIP, LID_TOP_Z + 0.4],         // lip front
                 [CLIP_INX - CLIP_IN*HOST_T/2, LID_TOP_Z + CLIP_RAMP_H]]);// lead-in ramp up into the wall
}
module lid_clip() {
    one_clip(CLIP_CY - CLIP_OFF);
    one_clip(CLIP_CY + CLIP_OFF);
}

// --- finger notch (CUT): a through-cut in the clip end wall, centred between the two clips.
//     Vertical sides + an ELLIPTICAL arched bottom (a rounded scoop, not a sharp box). Goes
//     THROUGH the wall so it reads as a visible scoop from the outside and a fingertip can
//     reach the lid edge to lift it. Deepest point is NOTCH_DEPTH below the rim.
module lid_finger_notch() {
    arch_cz = BODY_H - NOTCH_DEPTH + NOTCH_ARCH;          // z where the vertical sides meet the arc
    // vertical-sided upper part, open to the rim
    translate([CLIP_INX - EPS, CLIP_CY - NOTCH_W/2, arch_cz - EPS])
        cube([END_WALL + 2*EPS, NOTCH_W, (BODY_H + EPS) - (arch_cz - EPS)]);
    // elliptical arched bottom (y-semi = NOTCH_W/2, z-semi = NOTCH_ARCH), through the wall
    translate([CLIP_INX - EPS, CLIP_CY, arch_cz])
        scale([1, 1, NOTCH_ARCH/(NOTCH_W/2)])
        rotate([0, 90, 0])
        cylinder(h = END_WALL + 2*EPS, r = NOTCH_W/2, $fn = 48);
    // ALSO remove the support ledge across the notch span, so a fingertip can reach under the
    // lid edge here (the ledge/rail stays everywhere else to keep pinching the lid with the clips)
    lx0 = min(CLIP_INX, CLIP_INX + CLIP_IN*LEDGE_W) - EPS;
    lx1 = max(CLIP_INX, CLIP_INX + CLIP_IN*LEDGE_W) + EPS;
    translate([lx0, CLIP_CY - NOTCH_W/2, LID_Z_UNDER - LEDGE_W - EPS])
        cube([lx1 - lx0, NOTCH_W, LEDGE_W + 2*EPS]);
}

// --- restore the inner-top rim chamfer where the LOWERED dividers meet the +x (clip) end wall.
//     The box chamfer is interrupted at those junctions (the divider fills the inner side before
//     it is lowered), leaving a full-height bulge once lowered. The -x/hinge side is already
//     handled by the continuous journal chamfer; this does the same at the +x end.
module div_chamfer_fix() {
    cz = BODY_H - CHAMFER;            // 57, chamfer base
    xf = TOTAL_LEN - END_WALL;        // 202, +x clip-wall inner face
    for (yb = [DIV_KF, DIV_FS])
        translate([0, yb[0] - EPS, 0]) rotate([90,0,0]) translate([0,0,-((yb[1]-yb[0])+2*EPS)]) linear_extrude((yb[1]-yb[0])+2*EPS)
            polygon([[xf, cz], [xf - EPS, BODY_H + EPS], [xf + CHAMFER, BODY_H + EPS]]);  // bevel toward the wall (x>202)
}

// ============================================================================
// The six pieces.  piece = intersection(box, cell + own male keys) - own sockets
//   A halves are MALE on the A/B seam (keep the key); B halves are FEMALE (slot).
//   On a chamber seam the LEFT chamber is male (+Y), the right chamber is female.
// ============================================================================
// Base half-lap shingling (FEMALE-first, Option 1):
//   A/B seam  -> the B half owns the bottom shelf (grows -X), A has the negative.
//   chamber   -> the UPPER chamber (fork, spoon) owns the shelf (grows -Y); the
//                lower chamber (knife, fork) has the negative.
//   Assembly order: spoon, fork, knife; B before A (male lowered onto female).
// Center crossings (104,81)&(104,186): the CHAMBER shelf (fork_A / spoon_A) owns the
//   crossing square; the B-half A/B shelf (knife_B / fork_B) is CLIPPED short of the
//   chamber seam by LAP_LEN so two shelves never collide.
module knife_A() {                                       // placed LAST; receives everything
    difference() {
        union() {
            intersection() {
                box();
                union() {
                    cell(-1, AB_SEAM, KNIFE_Y0 - 1, KNIFE_Y1);
                    ab_key(YC_OUTL); ab_key(YC_DIVKF); ch_key(SEAM_KF, ENDC_A);
                    ab_cap(YC_OUTL); div_cap(YC_DIVKF); ch_cap(SEAM_KF, ENDC_A);  // hide tops (divider uses LOWERED hat)
                }
            }
            intersection() { lid_ledge(); cell(-1, AB_SEAM, KNIFE_Y0 - 1, KNIFE_Y1); }  // lid support ledge
        }
        lap_neg_X(KNIFE_Y0, KNIFE_Y1);            // receive knife_B's A/B shelf
        lap_neg_Y(SEAM_KF, 0, AB_SEAM);           // receive fork_A's chamber shelf
        hinge_groove(); divider_lower(); lid_finger_notch(); div_chamfer_fix();   // lid cuts (groove hits A pieces; divider/scallop where present)
    }
}

module knife_B() {
    difference() {
        union() {
            intersection() {
                box();
                union() {
                    cell(AB_SEAM, TOTAL_LEN + 1, KNIFE_Y0 - 1, KNIFE_Y1);
                    ch_key(SEAM_KF, ENDC_B);
                    ch_cap(SEAM_KF, ENDC_B);                // hide top (male, chamber)
                }
            }
            lap_shelf_X(KNIFE_Y0, KNIFE_Y1 - LAP_LEN);  // A/B shelf -> knife_A (CLIPPED at y=81 crossing)
            intersection() { lid_ledge(); cell(AB_SEAM, TOTAL_LEN + 1, KNIFE_Y0 - 1, KNIFE_Y1); }  // lid support ledge
        }
        ab_socket(YC_OUTL); ab_socket(YC_DIVKF);
        ab_cap_neg(YC_OUTL); div_cap_neg(YC_DIVKF);      // top recesses to receive knife_A's caps (divider = LOWERED hat)
        lap_neg_Y(SEAM_KF, AB_SEAM, TOTAL_LEN);         // receive fork_B's chamber shelf
        hinge_groove(); divider_lower(); lid_finger_notch(); div_chamfer_fix();   // lid cuts
    }
}

module fork_A() {
    difference() {
        union() {
            intersection() {
                box();
                union() {
                    cell(-1, AB_SEAM, FORK_Y0 + SEAM_EPS, FORK_Y1);  // -Y cut nudged off the divider face
                    ab_key(YC_DIVFS); ch_key(SEAM_FS, ENDC_A);
                    div_cap(YC_DIVFS); ch_cap(SEAM_FS, ENDC_A);       // hide tops (divider uses LOWERED hat)
                }
            }
            lap_shelf_Y(SEAM_KF, 0, AB_SEAM);           // chamber shelf -> knife_A (owns crossing)
            intersection() { lid_ledge(); cell(-1, AB_SEAM, FORK_Y0 + SEAM_EPS, FORK_Y1); }  // lid support ledge (none in fork-A)
        }
        lap_neg_X(FORK_Y0, FORK_Y1);                    // receive fork_B's A/B shelf
        ch_socket(SEAM_KF, ENDC_A);
        ch_cap_neg(SEAM_KF, ENDC_A);                    // top recess to receive knife_A's chamber cap (female)
        lap_neg_Y(SEAM_FS, 0, AB_SEAM, LAP_LEN_FS);     // receive spoon_A's (small) chamber shelf
        hinge_groove(); divider_lower(); lid_finger_notch(); div_chamfer_fix();   // lid cuts (groove = fork-A hinge segment; divider = DIV_FS)
    }
}

module fork_B() {
    union() {
        difference() {
            union() {
                intersection() {
                    box();
                    union() {
                        cell(AB_SEAM, TOTAL_LEN + 1, FORK_Y0 + SEAM_EPS, FORK_Y1);  // -Y cut nudged off the divider face
                        ch_key(SEAM_FS, ENDC_B);
                        ch_cap(SEAM_FS, ENDC_B);                // hide top (male, chamber)
                    }
                }
                lap_shelf_X(FORK_Y0, FORK_Y1 - LAP_LEN_FS); // A/B shelf -> fork_A (CLIPPED at y=186 crossing)
                lap_shelf_Y(SEAM_KF, AB_SEAM, TOTAL_LEN);   // chamber shelf -> knife_B
                intersection() { lid_ledge(); cell(AB_SEAM, TOTAL_LEN + 1, FORK_Y0 + SEAM_EPS, FORK_Y1); }  // lid ledge (clip-end run)
            }
            ab_socket(YC_DIVFS);
            div_cap_neg(YC_DIVFS);                           // top recess to receive fork_A's A/B cap (divider = LOWERED hat)
            ch_socket(SEAM_KF, ENDC_B);
            ch_cap_neg(SEAM_KF, ENDC_B);                    // top recess to receive knife_B's chamber cap (female)
            lap_neg_Y(SEAM_FS, AB_SEAM, TOTAL_LEN, LAP_LEN_FS); // receive spoon_B's (small) chamber shelf
            hinge_groove(); divider_lower(); lid_finger_notch(); div_chamfer_fix();     // lid cuts (scallop lands here)
        }
        intersection() { lid_clip(); cell(AB_SEAM, TOTAL_LEN + 1, FORK_Y0 + SEAM_EPS, FORK_Y1); }  // retaining clip, added AFTER the scallop cut
    }
}

module spoon_A() {
    difference() {
        union() {
            intersection() {
                box();
                union() {
                    cell(-1, AB_SEAM, SPOON_Y0 + SEAM_EPS, SPOON_Y1 + 1);  // -Y cut nudged off the divider face
                    ab_key(YC_OUTR);
                    ab_cap(YC_OUTR);                        // hide top (male)
                }
            }
            lap_shelf_Y(SEAM_FS, 0, AB_SEAM, LAP_LEN_FS); // chamber shelf -> fork_A (small; owns crossing)
            intersection() { lid_ledge(); cell(-1, AB_SEAM, SPOON_Y0 + SEAM_EPS, SPOON_Y1 + 1); }  // lid support ledge (OUTER_R run)
        }
        lap_neg_X(SPOON_Y0, SPOON_Y1);                  // receive spoon_B's A/B shelf
        ch_socket(SEAM_FS, ENDC_A);
        ch_cap_neg(SEAM_FS, ENDC_A);                    // top recess to receive fork_A's chamber cap (female)
        hinge_groove(); divider_lower(); lid_finger_notch(); div_chamfer_fix();   // lid cuts (groove = spoon-A hinge segment)
    }
}

module spoon_B() {                                      // placed FIRST; owns shelves
    difference() {
        union() {
            intersection() {
                box();
                union() {
                    cell(AB_SEAM, TOTAL_LEN + 1, SPOON_Y0 + SEAM_EPS, SPOON_Y1 + 1);  // -Y cut nudged off the divider face
                }
            }
            lap_shelf_X(SPOON_Y0, SPOON_Y1);            // A/B shelf -> spoon_A
            lap_shelf_Y(SEAM_FS, AB_SEAM, TOTAL_LEN, LAP_LEN_FS); // chamber shelf -> fork_B (small)
            intersection() { lid_ledge(); cell(AB_SEAM, TOTAL_LEN + 1, SPOON_Y0 + SEAM_EPS, SPOON_Y1 + 1); }  // lid ledge (OUTER_R + clip-end runs)
        }
        ab_socket(YC_OUTR);
        ab_cap_neg(YC_OUTR);                            // top recess to receive spoon_A's A/B cap (female)
        ch_socket(SEAM_FS, ENDC_B);
        ch_cap_neg(SEAM_FS, ENDC_B);                    // top recess to receive fork_B's chamber cap (female)
        hinge_groove(); divider_lower(); lid_finger_notch(); div_chamfer_fix();   // lid cuts
    }
}

// TRUE assembled view: the six real, separable pieces in their assembled positions
// (slower to render — many booleans — but this is what actually shows the seams, the
// lowered dividers, the hinge journal, the clip, the scallop, and all the joints).
// For a fast no-cuts preview of just the outer shell, temporarily use box(); instead.
module assembly() {
    knife_A(); knife_B(); fork_A(); fork_B(); spoon_A(); spoon_B();
}

// ============================================================================
// Render dispatch
// ============================================================================
if      (part == "knife_A")  knife_A();
else if (part == "knife_B")  knife_B();
else if (part == "fork_A")   fork_A();
else if (part == "fork_B")   fork_B();
else if (part == "spoon_A")  spoon_A();
else if (part == "spoon_B")  spoon_B();
else if (part == "assembly") assembly();
else echo(str("Unknown part: ", part));
